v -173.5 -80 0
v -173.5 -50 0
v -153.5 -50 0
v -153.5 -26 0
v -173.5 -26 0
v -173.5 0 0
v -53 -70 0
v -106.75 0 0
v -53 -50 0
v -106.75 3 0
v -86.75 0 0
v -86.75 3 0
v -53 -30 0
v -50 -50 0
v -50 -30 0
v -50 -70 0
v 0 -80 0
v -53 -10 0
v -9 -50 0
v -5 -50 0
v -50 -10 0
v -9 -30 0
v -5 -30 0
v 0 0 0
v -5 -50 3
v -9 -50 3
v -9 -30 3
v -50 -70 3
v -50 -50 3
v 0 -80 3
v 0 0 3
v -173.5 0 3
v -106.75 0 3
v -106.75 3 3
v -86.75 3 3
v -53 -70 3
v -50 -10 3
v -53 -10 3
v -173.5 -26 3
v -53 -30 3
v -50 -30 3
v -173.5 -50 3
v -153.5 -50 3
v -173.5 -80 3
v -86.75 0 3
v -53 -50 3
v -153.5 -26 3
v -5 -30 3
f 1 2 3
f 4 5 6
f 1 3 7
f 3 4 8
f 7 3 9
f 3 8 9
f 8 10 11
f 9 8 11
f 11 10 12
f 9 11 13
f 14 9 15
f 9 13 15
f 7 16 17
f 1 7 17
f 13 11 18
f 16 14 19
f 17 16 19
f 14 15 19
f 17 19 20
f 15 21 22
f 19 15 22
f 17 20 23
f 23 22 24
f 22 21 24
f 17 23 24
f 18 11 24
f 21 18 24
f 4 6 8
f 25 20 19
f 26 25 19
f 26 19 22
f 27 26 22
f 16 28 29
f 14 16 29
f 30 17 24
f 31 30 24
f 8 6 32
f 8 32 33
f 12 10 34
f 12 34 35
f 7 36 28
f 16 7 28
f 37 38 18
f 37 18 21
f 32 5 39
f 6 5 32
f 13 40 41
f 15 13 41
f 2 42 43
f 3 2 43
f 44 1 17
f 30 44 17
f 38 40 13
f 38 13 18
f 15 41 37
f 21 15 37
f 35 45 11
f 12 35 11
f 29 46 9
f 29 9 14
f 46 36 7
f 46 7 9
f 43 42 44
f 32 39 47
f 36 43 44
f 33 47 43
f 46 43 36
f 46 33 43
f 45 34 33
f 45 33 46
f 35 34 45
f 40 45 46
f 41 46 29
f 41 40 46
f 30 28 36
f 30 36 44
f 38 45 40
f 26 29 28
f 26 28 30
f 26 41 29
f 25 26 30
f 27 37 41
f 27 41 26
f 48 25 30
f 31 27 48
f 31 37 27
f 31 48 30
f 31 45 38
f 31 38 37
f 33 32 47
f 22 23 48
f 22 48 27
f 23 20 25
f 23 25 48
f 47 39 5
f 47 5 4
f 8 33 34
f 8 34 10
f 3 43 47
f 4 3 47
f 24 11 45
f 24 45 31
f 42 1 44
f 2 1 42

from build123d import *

# Parameters (mm, degrees)
ESQUISSE2_W             = 173.5
ESQUISSE2_H             = 80
BOSS_EXTRU_2_DEPTH      = 3
ENL_V_MAT_EXTRU_1_REACH = 193.079
ESQUISSE3_W             = 3
ESQUISSE3_H             = 20
ESQUISSE4_W             = 20
ESQUISSE4_H             = 3
BOSS_EXTRU_3_DEPTH      = 3
ESQUISSE5_W             = 4
ESQUISSE5_H             = 20
ENL_V_MAT_EXTRU_2_DEPTH = 10
ESQUISSE6_W             = 20
ESQUISSE6_H             = 24
ENL_V_MAT_EXTRU_3_DEPTH = 10


with BuildPart() as part:
    # Esquisse2 → Boss.-Extru.2 (new body)
    with BuildSketch(Plane.XY):
        with Locations((-86.75, -40)):
            Rectangle(ESQUISSE2_W, ESQUISSE2_H)
    extrude(amount=BOSS_EXTRU_2_DEPTH)

    # Esquisse3 → Enlèv. mat.-Extru.1 (cut, up to next)
    with BuildSketch(Plane.XY.offset(3), mode=Mode.PRIVATE) as enl_v_mat_extru_1_sk1:
        with Locations((-51.5, -60)):
            Rectangle(ESQUISSE3_W, ESQUISSE3_H)
    enl_v_mat_extru_1_tool1 = extrude(enl_v_mat_extru_1_sk1.sketch, amount=-ENL_V_MAT_EXTRU_1_REACH, mode=Mode.PRIVATE) & part.part
    # Esquisse3 → Enlèv. mat.-Extru.1 (cut, up to next)
    with BuildSketch(Plane.XY.offset(3), mode=Mode.PRIVATE) as enl_v_mat_extru_1_sk2:
        with Locations((-51.5, -20)):
            Rectangle(ESQUISSE3_W, ESQUISSE3_H)
    enl_v_mat_extru_1_tool2 = extrude(enl_v_mat_extru_1_sk2.sketch, amount=-ENL_V_MAT_EXTRU_1_REACH, mode=Mode.PRIVATE) & part.part
    add(enl_v_mat_extru_1_tool1.solids().sort_by_distance((-51.5, -60, 3))[0], mode=Mode.SUBTRACT)
    add(enl_v_mat_extru_1_tool2.solids().sort_by_distance((-51.5, -20, 3))[0], mode=Mode.SUBTRACT)

    # Esquisse4 → Boss.-Extru.3 (add)
    with BuildSketch(Plane(origin=(0, 0, 0), x_dir=(1, 0, 0), z_dir=(0, 1, 0))):
        with Locations((-96.75, -1.5)):
            Rectangle(ESQUISSE4_W, ESQUISSE4_H)
    extrude(amount=BOSS_EXTRU_3_DEPTH)

    # Esquisse5 → Enlèv. mat.-Extru.2 (cut)
    with BuildSketch(Plane(origin=(0, 0, 0), x_dir=(-1, 0, 0), z_dir=(0, 0, -1))):
        with Locations((7, -40)):
            Rectangle(ESQUISSE5_W, ESQUISSE5_H)
    extrude(amount=-ENL_V_MAT_EXTRU_2_DEPTH, mode=Mode.SUBTRACT)

    # Esquisse6 → Enlèv. mat.-Extru.3 (cut)
    with BuildSketch(Plane.XY.offset(3)):
        with Locations((-163.5, -38)):
            Rectangle(ESQUISSE6_W, ESQUISSE6_H)
    extrude(amount=-ENL_V_MAT_EXTRU_3_DEPTH, mode=Mode.SUBTRACT)


solid = part.part
